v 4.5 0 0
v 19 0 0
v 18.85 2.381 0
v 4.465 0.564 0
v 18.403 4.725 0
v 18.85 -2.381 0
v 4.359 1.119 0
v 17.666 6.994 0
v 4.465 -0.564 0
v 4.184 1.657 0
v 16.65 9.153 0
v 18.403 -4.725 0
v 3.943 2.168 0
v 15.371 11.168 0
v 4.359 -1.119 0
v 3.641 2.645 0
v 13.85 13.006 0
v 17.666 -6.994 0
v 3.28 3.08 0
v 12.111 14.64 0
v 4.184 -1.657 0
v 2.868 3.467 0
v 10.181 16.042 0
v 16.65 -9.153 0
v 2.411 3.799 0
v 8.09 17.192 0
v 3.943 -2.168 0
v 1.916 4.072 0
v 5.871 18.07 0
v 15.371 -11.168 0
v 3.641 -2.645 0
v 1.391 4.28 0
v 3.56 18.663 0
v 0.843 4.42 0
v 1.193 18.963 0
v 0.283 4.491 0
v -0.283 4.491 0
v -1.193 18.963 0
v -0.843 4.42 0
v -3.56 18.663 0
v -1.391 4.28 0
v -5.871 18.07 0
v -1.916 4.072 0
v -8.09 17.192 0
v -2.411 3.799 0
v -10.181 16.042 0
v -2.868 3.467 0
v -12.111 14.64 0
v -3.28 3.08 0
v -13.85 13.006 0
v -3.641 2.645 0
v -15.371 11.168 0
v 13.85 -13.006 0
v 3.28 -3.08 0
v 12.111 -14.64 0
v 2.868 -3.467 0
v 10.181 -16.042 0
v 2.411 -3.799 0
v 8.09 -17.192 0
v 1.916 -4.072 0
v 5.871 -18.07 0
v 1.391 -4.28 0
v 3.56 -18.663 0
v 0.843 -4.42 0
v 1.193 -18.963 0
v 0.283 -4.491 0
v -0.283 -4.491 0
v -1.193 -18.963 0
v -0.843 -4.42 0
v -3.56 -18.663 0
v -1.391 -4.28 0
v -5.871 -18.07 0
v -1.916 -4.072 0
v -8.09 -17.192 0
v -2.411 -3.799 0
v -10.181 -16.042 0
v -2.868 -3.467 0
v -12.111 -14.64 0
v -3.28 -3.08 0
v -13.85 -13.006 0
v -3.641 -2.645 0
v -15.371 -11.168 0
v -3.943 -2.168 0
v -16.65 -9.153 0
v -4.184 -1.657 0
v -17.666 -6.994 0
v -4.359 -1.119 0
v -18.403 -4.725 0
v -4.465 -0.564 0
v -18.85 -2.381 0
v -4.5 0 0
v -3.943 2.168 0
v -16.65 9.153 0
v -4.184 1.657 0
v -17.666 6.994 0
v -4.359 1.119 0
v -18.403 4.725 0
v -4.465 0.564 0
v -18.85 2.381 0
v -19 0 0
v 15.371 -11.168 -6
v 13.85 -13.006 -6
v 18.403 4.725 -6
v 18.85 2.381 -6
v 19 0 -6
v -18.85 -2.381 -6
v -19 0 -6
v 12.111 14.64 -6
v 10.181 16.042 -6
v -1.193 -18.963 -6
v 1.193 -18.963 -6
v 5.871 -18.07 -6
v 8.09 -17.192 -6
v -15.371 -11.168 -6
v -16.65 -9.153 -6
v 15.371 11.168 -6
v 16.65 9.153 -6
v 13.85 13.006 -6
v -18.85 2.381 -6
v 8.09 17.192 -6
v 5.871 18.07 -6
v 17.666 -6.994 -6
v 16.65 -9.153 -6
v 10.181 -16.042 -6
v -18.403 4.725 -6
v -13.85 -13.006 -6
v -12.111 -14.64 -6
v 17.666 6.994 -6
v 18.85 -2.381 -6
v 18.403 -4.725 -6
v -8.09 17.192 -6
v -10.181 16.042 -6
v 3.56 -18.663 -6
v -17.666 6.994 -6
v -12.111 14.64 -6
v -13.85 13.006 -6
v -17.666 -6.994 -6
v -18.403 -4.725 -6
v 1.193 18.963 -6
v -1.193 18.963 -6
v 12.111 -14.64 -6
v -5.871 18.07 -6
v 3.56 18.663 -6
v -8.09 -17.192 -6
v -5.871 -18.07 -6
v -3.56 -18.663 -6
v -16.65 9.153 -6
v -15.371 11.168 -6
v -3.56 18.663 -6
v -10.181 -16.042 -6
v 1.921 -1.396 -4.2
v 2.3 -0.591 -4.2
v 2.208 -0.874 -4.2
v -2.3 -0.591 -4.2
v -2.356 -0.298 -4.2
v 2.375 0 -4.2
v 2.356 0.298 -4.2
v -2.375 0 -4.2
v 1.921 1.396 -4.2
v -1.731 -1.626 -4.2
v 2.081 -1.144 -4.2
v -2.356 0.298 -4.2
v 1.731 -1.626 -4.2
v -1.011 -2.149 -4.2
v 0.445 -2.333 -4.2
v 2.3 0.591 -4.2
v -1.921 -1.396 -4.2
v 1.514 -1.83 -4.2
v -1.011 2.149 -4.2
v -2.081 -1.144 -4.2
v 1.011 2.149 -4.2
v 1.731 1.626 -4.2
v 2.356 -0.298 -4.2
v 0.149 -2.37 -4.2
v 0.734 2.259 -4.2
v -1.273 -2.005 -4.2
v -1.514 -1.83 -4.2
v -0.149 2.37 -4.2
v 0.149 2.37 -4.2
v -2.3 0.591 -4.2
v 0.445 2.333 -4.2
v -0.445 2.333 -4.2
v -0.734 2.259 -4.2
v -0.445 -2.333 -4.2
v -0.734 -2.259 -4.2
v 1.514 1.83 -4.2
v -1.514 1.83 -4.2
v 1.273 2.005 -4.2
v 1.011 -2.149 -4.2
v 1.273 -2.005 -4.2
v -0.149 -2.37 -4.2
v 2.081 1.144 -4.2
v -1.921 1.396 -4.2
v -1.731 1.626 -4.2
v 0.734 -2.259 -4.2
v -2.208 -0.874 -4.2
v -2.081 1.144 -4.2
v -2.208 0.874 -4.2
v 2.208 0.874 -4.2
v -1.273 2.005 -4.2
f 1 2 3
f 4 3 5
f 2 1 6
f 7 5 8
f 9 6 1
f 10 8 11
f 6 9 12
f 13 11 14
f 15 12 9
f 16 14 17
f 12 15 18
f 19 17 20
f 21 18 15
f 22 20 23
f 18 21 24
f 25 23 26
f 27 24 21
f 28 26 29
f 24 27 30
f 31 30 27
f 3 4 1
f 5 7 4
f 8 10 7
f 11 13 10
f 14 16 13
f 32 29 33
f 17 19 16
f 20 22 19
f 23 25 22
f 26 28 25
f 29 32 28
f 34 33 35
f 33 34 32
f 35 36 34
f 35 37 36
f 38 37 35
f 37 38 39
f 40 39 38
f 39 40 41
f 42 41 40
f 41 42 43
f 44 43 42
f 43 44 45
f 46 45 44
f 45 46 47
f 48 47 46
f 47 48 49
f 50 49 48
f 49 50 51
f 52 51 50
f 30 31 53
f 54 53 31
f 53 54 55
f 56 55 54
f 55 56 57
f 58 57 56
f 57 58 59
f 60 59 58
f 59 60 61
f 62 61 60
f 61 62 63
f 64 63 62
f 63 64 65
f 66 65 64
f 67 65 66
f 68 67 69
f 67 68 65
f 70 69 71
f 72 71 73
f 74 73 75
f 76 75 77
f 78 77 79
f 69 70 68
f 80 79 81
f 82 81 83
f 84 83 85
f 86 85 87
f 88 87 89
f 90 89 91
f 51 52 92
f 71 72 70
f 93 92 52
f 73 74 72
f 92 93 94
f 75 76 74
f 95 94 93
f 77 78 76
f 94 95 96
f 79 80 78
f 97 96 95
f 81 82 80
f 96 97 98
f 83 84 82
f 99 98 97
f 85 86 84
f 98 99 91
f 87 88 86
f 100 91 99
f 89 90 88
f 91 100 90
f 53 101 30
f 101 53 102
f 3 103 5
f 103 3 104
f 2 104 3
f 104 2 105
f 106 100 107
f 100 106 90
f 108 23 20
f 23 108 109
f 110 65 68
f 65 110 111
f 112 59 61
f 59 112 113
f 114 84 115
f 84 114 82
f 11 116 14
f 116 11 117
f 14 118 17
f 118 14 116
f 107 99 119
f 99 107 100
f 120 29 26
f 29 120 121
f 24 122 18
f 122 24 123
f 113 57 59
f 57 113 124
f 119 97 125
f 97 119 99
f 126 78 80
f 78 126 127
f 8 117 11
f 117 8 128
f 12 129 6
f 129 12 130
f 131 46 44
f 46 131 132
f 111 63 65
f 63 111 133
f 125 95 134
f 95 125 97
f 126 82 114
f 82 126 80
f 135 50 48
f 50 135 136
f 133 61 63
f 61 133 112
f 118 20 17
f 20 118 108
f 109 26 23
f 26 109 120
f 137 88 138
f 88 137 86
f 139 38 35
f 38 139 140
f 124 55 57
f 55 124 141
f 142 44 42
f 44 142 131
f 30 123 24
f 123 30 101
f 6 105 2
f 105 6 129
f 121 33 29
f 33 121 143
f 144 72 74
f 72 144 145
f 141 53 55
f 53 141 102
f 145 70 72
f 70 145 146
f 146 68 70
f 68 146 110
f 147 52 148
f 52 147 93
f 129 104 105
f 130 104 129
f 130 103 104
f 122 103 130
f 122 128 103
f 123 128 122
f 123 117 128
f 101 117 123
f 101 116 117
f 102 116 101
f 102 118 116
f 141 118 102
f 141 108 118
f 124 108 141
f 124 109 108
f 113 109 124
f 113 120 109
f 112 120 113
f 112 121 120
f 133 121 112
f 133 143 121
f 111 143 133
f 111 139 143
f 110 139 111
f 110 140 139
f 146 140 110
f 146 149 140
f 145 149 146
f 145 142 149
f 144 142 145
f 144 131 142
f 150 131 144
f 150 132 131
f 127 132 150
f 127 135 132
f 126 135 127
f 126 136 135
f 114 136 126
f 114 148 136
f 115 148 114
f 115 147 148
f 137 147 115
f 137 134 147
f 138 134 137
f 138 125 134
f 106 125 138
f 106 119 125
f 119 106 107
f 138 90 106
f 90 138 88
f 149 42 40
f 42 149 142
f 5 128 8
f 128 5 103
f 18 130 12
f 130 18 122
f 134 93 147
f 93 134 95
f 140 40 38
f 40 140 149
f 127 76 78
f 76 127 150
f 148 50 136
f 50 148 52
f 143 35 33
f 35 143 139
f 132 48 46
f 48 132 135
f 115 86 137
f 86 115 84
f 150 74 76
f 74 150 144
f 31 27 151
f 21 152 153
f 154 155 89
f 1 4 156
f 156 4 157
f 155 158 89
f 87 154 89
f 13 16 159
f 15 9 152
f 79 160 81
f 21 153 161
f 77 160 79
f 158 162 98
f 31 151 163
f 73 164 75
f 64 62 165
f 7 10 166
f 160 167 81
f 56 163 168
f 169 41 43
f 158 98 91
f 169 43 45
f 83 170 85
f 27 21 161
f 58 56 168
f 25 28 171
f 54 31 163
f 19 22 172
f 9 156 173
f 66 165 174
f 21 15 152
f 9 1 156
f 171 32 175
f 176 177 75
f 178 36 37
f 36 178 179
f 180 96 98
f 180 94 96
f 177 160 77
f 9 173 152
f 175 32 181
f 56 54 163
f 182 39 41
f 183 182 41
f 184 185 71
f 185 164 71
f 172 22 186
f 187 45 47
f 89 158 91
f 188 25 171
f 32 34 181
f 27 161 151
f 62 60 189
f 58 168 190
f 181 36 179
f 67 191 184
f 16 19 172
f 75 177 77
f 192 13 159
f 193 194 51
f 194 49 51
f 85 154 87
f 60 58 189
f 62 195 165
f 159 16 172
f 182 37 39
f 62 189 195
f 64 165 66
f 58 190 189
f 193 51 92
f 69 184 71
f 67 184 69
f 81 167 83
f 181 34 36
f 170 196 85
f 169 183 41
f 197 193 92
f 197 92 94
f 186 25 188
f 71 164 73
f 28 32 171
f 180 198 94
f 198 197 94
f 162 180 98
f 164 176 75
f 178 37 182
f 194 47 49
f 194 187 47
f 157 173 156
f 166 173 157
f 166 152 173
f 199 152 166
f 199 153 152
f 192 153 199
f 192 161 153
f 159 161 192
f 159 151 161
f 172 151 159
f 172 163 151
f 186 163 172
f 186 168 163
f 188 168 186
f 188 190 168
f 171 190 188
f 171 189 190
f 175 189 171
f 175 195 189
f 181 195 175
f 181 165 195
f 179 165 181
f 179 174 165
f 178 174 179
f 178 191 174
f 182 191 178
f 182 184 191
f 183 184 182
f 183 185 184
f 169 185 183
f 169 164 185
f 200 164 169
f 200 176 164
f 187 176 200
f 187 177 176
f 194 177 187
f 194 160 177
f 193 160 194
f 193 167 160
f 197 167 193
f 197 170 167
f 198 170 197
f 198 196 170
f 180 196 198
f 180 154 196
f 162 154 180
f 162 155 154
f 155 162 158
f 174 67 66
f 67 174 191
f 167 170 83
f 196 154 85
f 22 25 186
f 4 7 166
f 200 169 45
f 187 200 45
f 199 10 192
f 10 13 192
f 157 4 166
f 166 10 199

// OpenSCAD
$fn = 50;


difference() {
	union() {
		translate(v = [0, 0, -3.0000000000]) {
			cylinder(h = 3, r = 10.0000000000);
		}
		translate(v = [0, 0, -6.0000000000]) {
			cylinder(h = 6, r = 19.0000000000);
		}
	}
	union() {
		translate(v = [0, 0, 0]) {
			rotate(a = [0, 0, 0]) {
				difference() {
					union() {
						#translate(v = [0, 0, -3.0000000000]) {
							cylinder(h = 3, r = 2.2500000000);
						}
						#translate(v = [0, 0, -4.2000000000]) {
							cylinder(h = 4.2000000000, r = 10.0000000000, r1 = 2.3750000000, r2 = 4.5000000000);
						}
						#translate(v = [0, 0, -3.0000000000]) {
							cylinder(h = 3, r = 2.3750000000);
						}
						#translate(v = [0, 0, -3.0000000000]) {
							cylinder(h = 3, r = 2.2500000000);
						}
					}
					union();
				}
			}
		}
	}
}
